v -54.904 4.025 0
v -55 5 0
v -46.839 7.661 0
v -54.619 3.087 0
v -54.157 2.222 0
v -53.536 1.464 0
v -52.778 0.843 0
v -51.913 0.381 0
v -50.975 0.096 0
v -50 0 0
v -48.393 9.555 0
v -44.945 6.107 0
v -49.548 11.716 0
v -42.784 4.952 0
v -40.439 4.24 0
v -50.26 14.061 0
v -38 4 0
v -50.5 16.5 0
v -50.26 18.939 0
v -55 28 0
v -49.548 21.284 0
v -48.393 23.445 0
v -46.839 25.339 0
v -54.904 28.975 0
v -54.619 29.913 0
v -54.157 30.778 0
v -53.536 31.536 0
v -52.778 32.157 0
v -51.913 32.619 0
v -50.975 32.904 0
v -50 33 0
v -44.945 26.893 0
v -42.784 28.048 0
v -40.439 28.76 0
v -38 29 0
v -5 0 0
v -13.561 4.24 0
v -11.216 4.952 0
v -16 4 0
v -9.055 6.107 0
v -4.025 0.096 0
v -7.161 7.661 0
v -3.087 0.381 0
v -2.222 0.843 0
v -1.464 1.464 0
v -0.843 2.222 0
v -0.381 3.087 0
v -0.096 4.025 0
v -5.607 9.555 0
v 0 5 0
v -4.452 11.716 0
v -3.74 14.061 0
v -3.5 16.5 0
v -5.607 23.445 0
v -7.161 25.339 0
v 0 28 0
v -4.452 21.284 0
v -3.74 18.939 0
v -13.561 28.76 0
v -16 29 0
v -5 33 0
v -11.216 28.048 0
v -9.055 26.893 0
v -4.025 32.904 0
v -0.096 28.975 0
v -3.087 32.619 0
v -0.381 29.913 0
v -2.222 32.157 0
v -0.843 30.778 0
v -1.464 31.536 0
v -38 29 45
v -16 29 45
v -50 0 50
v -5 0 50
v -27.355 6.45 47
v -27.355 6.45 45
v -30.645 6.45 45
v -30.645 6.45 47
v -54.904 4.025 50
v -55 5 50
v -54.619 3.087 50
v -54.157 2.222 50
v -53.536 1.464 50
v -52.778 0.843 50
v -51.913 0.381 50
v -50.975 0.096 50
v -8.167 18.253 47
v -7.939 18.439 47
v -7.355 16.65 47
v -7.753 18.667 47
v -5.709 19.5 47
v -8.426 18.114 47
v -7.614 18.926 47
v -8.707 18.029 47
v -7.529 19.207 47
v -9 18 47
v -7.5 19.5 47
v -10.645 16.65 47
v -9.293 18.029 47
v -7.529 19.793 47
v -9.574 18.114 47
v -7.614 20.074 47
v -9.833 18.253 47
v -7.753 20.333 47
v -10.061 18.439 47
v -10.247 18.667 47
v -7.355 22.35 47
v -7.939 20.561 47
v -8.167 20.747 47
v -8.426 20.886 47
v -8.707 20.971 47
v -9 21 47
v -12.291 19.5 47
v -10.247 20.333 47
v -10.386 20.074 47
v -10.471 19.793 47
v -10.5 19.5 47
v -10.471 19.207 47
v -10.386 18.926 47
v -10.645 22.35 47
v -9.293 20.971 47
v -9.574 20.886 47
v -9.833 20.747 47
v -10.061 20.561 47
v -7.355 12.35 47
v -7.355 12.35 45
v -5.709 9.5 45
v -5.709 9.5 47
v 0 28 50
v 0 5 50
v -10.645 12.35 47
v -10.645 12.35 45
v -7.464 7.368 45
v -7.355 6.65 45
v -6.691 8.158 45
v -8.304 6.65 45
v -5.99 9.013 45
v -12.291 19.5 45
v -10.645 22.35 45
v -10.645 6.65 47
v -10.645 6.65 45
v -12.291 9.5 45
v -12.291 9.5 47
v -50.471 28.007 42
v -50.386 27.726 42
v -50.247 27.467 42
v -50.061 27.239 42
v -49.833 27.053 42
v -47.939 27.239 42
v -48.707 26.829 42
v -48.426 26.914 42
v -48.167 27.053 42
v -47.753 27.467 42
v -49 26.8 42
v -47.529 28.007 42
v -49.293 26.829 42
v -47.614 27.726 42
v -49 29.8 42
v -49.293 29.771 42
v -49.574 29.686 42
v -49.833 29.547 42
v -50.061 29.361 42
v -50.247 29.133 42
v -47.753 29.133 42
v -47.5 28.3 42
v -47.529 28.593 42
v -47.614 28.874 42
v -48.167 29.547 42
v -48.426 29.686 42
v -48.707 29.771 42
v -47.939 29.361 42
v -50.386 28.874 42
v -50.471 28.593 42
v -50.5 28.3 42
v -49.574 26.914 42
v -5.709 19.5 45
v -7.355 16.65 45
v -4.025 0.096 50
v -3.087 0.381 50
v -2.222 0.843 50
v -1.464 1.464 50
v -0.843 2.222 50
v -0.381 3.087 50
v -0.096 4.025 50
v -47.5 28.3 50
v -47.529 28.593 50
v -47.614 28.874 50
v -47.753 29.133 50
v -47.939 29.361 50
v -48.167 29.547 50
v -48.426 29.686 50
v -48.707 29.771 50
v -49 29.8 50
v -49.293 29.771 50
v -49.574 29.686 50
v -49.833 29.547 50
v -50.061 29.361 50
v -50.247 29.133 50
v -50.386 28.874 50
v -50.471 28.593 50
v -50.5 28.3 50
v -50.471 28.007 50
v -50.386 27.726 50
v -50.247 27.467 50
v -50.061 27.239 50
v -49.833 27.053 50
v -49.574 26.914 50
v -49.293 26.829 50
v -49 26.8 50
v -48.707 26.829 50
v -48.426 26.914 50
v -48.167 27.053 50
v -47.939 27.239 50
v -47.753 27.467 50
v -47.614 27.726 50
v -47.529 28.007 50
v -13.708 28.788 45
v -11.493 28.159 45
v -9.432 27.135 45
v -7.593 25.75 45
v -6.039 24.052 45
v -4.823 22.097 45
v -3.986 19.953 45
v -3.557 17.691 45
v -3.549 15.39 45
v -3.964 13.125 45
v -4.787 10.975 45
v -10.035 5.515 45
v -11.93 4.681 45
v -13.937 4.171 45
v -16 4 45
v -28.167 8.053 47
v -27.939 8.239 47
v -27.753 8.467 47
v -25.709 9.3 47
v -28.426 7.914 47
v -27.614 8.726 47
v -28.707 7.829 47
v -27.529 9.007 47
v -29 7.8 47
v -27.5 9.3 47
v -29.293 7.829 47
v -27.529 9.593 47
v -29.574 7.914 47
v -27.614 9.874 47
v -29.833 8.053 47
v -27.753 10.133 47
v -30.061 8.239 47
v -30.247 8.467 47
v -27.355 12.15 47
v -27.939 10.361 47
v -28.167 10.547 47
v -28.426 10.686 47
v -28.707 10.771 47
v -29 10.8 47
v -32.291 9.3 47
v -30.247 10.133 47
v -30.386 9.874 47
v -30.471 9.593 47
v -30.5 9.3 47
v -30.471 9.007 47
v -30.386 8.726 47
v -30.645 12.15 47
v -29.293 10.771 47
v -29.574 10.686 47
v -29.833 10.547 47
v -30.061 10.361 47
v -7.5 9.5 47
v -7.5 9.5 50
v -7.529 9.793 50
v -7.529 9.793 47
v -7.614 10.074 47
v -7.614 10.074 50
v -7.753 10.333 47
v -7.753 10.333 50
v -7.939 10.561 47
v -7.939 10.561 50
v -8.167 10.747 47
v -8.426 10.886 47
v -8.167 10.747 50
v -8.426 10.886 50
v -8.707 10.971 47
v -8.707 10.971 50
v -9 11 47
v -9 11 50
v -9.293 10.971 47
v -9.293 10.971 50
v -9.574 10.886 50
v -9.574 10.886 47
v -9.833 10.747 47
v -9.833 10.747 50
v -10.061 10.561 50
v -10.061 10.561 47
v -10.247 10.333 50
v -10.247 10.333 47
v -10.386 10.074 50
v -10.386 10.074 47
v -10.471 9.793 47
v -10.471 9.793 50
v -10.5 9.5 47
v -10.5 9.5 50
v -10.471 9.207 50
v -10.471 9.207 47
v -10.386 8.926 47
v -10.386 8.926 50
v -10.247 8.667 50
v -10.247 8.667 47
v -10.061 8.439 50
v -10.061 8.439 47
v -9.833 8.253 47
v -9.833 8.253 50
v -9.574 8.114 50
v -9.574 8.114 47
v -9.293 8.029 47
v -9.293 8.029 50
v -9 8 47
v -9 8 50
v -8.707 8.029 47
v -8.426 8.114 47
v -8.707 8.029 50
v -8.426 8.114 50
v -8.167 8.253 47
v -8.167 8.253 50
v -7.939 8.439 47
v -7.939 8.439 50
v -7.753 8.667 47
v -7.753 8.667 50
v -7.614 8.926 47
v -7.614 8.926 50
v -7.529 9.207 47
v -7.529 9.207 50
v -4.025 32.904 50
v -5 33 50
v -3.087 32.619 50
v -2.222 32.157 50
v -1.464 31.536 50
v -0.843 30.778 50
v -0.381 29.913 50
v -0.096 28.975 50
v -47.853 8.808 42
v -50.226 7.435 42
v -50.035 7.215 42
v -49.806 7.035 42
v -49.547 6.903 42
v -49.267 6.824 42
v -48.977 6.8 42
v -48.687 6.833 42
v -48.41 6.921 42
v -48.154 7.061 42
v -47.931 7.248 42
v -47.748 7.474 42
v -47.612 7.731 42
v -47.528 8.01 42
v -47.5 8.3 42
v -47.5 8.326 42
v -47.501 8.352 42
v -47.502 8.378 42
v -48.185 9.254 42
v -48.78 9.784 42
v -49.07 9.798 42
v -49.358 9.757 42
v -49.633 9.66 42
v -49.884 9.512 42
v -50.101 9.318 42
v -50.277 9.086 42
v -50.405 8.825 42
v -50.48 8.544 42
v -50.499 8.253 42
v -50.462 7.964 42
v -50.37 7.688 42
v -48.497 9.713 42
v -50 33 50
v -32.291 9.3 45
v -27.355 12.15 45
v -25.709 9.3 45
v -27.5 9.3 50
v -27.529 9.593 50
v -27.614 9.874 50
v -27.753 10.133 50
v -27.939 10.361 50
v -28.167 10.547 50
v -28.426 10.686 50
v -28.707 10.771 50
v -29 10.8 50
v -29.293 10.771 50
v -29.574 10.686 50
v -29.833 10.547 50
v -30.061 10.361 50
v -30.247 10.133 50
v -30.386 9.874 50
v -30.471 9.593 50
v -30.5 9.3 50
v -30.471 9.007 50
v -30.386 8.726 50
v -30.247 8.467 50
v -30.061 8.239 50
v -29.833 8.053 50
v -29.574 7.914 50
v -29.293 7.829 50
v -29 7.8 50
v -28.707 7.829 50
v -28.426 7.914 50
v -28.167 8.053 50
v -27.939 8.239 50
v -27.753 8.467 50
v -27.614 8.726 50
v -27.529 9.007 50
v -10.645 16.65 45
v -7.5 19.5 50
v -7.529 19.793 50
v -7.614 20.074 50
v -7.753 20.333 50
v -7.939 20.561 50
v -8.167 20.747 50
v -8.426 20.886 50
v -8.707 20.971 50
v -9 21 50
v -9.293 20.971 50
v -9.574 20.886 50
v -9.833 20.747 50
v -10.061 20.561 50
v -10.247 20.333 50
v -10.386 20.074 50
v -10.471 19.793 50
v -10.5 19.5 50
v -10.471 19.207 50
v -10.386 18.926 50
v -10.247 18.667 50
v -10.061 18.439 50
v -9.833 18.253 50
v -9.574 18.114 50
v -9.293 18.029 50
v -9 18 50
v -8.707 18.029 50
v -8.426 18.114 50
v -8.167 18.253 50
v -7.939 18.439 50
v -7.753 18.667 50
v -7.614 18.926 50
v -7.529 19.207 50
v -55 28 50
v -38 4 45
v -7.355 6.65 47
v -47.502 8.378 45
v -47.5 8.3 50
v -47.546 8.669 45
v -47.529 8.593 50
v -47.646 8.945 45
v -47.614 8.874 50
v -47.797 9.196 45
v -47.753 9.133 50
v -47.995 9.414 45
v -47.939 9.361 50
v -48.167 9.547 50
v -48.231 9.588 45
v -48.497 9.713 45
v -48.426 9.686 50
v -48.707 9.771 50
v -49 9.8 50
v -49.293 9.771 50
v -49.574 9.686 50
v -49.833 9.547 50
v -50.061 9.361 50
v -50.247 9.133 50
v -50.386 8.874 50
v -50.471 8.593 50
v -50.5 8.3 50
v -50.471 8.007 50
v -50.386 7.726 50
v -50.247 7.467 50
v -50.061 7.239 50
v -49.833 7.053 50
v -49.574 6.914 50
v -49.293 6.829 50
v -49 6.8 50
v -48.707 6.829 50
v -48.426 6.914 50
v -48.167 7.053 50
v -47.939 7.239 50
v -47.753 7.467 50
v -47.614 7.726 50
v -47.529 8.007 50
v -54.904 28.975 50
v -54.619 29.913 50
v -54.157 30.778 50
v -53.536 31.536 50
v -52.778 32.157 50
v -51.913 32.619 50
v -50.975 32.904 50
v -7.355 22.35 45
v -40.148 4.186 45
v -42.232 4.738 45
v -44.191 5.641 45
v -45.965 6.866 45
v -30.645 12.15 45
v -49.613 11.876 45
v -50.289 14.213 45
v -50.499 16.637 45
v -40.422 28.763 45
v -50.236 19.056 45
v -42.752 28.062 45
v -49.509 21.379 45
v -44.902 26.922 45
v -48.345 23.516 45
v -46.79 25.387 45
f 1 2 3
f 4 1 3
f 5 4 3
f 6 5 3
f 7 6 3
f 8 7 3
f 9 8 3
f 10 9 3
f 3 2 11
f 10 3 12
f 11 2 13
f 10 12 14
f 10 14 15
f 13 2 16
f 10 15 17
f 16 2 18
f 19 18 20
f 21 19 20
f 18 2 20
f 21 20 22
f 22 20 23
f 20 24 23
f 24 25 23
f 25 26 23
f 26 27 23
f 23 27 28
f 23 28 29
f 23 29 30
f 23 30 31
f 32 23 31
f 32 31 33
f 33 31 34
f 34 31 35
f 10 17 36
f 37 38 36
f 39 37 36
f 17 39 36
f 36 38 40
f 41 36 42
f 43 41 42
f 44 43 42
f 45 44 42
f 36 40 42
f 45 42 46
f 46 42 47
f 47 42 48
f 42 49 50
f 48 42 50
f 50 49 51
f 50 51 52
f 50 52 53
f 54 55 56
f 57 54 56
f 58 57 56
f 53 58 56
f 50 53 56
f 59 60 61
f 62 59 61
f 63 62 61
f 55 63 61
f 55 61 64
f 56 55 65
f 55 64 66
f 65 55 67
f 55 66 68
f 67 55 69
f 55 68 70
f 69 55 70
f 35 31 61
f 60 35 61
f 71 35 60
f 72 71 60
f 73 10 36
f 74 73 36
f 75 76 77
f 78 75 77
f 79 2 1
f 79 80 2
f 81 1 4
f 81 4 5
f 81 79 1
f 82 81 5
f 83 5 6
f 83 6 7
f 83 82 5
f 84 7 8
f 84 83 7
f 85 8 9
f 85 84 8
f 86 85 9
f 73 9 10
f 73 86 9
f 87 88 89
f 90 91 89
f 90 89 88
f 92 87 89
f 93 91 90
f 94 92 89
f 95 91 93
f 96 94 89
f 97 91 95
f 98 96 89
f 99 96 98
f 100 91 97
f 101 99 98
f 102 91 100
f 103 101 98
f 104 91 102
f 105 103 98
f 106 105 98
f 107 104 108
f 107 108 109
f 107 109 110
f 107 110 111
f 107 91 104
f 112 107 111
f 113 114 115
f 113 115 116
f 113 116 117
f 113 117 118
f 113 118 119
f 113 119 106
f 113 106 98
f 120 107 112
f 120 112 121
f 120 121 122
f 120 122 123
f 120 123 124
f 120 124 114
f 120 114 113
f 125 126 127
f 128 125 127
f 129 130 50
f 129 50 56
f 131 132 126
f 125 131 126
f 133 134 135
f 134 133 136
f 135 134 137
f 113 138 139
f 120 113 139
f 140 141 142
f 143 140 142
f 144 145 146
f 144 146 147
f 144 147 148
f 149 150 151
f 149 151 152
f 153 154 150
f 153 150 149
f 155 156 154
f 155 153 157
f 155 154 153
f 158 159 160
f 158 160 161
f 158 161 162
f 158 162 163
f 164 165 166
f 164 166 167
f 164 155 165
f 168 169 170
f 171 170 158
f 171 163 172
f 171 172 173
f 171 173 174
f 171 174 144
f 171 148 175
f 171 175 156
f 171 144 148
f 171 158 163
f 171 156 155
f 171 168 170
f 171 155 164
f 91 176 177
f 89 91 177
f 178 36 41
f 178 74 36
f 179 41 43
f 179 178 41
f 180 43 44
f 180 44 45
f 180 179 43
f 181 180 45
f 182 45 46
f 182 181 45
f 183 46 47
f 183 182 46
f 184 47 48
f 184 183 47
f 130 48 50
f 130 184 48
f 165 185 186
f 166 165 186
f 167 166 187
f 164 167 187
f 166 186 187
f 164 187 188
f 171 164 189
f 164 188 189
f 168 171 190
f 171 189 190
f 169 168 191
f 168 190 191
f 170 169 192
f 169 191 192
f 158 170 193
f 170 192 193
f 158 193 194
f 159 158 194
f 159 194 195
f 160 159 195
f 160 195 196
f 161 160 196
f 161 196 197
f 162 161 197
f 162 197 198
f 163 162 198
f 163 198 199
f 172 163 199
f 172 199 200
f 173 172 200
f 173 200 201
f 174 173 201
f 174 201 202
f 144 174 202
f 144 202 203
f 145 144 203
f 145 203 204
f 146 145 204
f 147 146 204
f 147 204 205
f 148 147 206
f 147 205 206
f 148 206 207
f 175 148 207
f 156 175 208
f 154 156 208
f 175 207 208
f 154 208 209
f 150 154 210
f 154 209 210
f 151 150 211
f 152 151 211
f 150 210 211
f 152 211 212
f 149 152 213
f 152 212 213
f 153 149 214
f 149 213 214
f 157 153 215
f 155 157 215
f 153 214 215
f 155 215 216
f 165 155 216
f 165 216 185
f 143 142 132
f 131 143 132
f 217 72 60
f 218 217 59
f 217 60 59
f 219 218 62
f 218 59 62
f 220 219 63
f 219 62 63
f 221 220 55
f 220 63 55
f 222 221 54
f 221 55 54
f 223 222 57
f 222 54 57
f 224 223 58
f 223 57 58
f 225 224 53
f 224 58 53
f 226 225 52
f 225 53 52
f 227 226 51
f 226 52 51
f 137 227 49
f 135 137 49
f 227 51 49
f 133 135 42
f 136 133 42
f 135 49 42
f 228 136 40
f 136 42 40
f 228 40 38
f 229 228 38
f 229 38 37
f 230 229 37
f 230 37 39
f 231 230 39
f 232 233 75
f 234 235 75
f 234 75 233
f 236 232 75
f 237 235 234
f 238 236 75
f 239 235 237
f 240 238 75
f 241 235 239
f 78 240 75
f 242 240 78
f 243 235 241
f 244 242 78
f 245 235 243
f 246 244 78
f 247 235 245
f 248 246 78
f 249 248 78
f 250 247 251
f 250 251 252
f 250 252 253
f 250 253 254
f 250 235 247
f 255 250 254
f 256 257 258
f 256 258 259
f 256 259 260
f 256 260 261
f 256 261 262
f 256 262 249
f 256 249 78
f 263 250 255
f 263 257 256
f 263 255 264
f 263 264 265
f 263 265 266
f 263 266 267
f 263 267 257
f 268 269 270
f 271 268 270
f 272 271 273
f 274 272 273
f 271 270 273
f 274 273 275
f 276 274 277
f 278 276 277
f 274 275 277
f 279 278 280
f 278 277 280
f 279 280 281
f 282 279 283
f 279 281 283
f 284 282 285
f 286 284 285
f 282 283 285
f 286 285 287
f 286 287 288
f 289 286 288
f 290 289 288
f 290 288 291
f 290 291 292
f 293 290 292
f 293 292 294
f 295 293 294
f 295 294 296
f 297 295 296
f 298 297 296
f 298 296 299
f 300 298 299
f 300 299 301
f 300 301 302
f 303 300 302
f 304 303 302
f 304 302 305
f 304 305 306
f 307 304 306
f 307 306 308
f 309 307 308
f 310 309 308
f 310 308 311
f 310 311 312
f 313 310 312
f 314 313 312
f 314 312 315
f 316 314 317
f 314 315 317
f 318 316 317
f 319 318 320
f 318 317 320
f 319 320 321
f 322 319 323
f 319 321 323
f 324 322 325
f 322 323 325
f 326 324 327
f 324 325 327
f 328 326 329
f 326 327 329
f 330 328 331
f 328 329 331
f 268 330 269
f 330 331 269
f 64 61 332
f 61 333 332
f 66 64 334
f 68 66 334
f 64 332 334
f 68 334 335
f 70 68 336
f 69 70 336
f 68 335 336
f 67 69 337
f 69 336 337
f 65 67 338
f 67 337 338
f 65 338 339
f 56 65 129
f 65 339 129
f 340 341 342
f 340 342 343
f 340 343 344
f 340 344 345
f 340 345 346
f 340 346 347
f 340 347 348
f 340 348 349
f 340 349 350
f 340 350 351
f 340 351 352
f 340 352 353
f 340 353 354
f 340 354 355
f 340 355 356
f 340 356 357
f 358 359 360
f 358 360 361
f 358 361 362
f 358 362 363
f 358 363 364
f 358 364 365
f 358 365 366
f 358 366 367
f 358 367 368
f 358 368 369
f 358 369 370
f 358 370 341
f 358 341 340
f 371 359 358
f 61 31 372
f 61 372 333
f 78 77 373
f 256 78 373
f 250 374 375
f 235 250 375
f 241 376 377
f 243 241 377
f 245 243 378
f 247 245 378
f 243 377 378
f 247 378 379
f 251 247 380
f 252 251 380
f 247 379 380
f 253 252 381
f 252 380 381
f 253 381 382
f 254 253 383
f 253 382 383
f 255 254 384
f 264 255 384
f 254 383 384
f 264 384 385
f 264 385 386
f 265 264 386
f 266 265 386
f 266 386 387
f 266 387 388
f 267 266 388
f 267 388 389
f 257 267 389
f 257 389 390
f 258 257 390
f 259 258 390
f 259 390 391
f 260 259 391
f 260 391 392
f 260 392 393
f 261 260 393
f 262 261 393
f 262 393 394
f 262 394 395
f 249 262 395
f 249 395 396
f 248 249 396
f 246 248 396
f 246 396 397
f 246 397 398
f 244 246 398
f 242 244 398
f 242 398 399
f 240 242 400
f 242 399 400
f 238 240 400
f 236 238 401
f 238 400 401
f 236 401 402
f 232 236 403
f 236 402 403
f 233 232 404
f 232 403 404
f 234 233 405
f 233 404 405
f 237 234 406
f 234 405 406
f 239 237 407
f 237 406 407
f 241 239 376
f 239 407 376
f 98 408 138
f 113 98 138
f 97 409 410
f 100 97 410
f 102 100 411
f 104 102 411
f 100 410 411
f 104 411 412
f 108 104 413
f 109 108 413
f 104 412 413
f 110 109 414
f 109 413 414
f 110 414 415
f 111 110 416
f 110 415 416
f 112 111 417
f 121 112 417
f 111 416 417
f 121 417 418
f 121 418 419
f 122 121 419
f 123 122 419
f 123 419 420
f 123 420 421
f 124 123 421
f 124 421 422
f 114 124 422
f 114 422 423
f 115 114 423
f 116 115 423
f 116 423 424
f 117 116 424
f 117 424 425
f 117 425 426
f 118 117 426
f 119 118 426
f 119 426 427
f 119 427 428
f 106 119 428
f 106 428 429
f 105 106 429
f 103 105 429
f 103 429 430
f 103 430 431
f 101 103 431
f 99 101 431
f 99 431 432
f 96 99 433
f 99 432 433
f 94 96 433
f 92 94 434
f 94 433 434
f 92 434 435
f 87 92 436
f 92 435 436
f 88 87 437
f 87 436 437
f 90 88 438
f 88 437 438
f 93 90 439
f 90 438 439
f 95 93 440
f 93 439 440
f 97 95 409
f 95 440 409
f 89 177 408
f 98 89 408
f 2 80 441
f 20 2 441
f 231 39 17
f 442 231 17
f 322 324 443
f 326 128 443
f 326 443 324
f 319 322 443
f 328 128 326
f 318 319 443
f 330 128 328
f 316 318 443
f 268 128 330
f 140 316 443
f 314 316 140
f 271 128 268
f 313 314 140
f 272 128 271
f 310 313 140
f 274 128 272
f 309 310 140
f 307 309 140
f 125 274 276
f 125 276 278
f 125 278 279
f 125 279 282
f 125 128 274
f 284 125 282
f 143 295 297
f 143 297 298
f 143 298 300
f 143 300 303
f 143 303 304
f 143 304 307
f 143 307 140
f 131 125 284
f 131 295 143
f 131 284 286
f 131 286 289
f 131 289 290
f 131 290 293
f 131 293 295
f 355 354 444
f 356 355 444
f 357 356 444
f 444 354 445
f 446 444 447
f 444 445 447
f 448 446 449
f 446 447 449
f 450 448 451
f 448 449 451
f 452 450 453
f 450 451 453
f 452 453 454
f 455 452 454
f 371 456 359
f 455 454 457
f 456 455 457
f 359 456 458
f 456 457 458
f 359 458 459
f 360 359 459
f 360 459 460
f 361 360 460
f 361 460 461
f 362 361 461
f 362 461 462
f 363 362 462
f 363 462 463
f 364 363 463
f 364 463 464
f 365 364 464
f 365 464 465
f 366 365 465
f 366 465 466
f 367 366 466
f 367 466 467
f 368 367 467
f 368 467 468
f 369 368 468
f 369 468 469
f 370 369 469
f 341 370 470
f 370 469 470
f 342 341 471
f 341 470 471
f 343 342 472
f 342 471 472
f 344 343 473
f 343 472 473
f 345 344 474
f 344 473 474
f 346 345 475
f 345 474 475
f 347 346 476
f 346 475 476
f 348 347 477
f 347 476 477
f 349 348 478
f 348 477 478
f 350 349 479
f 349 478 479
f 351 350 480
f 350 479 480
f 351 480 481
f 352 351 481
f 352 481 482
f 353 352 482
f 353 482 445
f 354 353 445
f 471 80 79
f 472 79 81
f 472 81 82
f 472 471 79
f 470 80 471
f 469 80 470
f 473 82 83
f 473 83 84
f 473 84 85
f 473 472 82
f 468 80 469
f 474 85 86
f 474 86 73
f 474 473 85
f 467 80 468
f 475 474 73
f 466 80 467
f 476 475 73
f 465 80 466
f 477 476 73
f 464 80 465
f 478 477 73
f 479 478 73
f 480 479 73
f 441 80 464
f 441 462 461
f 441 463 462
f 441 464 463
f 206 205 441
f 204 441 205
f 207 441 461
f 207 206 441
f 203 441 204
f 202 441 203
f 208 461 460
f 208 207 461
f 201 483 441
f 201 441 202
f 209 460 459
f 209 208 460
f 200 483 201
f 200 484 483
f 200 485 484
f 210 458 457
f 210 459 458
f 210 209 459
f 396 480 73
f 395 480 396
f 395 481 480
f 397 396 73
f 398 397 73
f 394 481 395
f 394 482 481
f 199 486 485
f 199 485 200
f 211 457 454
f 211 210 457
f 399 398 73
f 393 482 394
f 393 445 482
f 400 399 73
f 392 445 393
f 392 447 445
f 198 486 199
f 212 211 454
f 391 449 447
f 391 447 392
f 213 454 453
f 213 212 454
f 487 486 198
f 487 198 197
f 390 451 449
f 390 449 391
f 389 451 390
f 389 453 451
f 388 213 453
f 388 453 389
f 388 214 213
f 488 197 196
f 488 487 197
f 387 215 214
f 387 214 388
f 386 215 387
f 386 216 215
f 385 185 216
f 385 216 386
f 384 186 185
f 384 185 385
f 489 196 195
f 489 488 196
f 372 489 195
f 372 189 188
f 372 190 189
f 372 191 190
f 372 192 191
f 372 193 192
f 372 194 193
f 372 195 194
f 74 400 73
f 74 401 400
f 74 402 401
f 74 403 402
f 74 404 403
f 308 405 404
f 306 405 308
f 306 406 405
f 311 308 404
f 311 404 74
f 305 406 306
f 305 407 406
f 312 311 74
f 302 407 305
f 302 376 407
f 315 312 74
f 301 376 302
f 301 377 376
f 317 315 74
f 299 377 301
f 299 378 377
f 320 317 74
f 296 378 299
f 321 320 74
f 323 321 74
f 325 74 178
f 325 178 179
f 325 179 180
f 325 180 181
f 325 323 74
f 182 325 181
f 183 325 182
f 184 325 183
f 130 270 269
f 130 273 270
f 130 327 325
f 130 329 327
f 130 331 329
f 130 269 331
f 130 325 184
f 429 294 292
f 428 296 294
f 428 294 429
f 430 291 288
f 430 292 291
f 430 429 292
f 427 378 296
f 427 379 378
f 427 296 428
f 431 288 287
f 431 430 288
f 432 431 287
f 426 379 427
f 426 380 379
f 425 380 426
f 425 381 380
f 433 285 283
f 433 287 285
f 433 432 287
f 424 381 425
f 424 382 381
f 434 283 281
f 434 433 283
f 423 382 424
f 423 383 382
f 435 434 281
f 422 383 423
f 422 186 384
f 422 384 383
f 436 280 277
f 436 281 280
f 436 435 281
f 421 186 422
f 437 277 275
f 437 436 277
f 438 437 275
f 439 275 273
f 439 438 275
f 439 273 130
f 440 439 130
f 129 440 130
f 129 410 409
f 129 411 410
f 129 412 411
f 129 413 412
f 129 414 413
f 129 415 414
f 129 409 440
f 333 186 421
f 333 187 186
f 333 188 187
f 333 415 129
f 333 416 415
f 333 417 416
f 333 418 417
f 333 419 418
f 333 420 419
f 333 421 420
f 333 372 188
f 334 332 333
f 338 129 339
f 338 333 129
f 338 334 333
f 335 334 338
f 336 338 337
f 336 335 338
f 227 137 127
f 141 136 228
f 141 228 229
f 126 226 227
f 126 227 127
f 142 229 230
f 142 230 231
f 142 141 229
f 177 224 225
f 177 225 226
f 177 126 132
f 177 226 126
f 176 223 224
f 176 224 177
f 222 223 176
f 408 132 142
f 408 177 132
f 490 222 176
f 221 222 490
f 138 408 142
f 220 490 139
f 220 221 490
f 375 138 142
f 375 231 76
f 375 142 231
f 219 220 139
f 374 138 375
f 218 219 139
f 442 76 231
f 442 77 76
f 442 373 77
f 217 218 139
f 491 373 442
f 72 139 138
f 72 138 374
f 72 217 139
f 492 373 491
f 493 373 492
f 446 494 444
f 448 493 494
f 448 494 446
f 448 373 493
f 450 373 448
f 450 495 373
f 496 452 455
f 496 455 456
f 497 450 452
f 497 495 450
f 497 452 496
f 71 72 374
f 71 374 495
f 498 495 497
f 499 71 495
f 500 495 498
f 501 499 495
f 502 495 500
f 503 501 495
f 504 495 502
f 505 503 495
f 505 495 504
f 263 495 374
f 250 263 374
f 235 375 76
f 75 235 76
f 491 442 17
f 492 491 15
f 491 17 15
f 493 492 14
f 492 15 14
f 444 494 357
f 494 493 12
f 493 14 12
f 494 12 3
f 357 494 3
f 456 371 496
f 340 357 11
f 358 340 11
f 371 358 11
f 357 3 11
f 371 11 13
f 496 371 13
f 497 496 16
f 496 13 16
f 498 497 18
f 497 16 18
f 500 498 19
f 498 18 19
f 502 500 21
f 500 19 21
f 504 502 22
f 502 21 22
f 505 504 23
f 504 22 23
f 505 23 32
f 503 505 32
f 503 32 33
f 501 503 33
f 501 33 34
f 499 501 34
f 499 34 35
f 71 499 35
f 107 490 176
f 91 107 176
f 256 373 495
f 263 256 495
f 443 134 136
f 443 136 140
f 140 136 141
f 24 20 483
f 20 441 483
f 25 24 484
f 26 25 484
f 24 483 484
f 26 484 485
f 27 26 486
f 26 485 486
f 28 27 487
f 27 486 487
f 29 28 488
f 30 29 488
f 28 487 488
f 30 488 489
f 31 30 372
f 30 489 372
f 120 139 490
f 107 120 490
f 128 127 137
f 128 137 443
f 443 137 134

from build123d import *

# Parameters (mm, degrees)
ESQUISSE1_W             = 55
ESQUISSE1_H             = 33
BOSS_EXTRU_1_DEPTH      = 50
ENL_V_MAT_EXTRU_2_DEPTH = 45
CONG_1_R                = 5
ESQUISSE3_R             = 1.5
ENL_V_MAT_EXTRU_3_DEPTH = 10
ENL_V_MAT_EXTRU_4_DEPTH = 2
ESQUISSE5_R             = 1.5
ENL_V_MAT_EXTRU_5_DEPTH = 4
ESQUISSE6_R             = 1.5
ENL_V_MAT_EXTRU_7_DEPTH = 4


with BuildPart() as part:
    # Esquisse1 → Boss.-Extru.1 (new body)
    with BuildSketch(Plane.XY):
        with Locations((-27.5, 16.5)):
            Rectangle(ESQUISSE1_W, ESQUISSE1_H)
    extrude(amount=BOSS_EXTRU_1_DEPTH)

    # Esquisse2 → Enlèv. mat.-Extru.2 (cut)
    with BuildSketch(Plane.XY):
        with BuildLine():
            Line((-38, 29), (-16, 29))
            ThreePointArc((-16, 29), (-3.5, 16.5), (-16, 4))
            Line((-16, 4), (-38, 4))
            ThreePointArc((-38, 4), (-50.5, 16.5), (-38, 29))
        make_face()
    extrude(amount=ENL_V_MAT_EXTRU_2_DEPTH, mode=Mode.SUBTRACT)

    # Congé1
    cong_1_edges = [part.edges().sort_by_distance(p)[0] for p in [
        (0, 0, 25),
        (-55, 0, 25),
        (-55, 33, 25),
        (0, 33, 25),
    ]]
    fillet(cong_1_edges, radius=CONG_1_R)

    # Esquisse3 → Enlèv. mat.-Extru.3 (cut)
    with BuildSketch(Plane.XY.offset(50)):
        with Locations((-29, 9.3)):
            Circle(ESQUISSE3_R)
        with Locations((-9, 19.5)):
            Circle(ESQUISSE3_R)
        with Locations((-9, 9.5)):
            Circle(ESQUISSE3_R)
    extrude(amount=-ENL_V_MAT_EXTRU_3_DEPTH, mode=Mode.SUBTRACT)

    # Esquisse4 → Enlèv. mat.-Extru.4 (cut)
    with BuildSketch(Plane(origin=(0, 0, 45), x_dir=(-1, 0, 0), z_dir=(0, 0, -1))):
        Polygon((27.354551733, 6.45), (30.645448267, 6.45), (32.290896534, 9.3), (30.645448267, 12.15), (27.354551733, 12.15), (25.709103466, 9.3), align=None)
        Polygon((7.354551733, 6.65), (10.645448267, 6.65), (12.290896534, 9.5), (10.645448267, 12.35), (7.354551733, 12.35), (5.709103466, 9.5), align=None)
        Polygon((7.354551733, 16.65), (10.645448267, 16.65), (12.290896534, 19.5), (10.645448267, 22.35), (7.354551733, 22.35), (5.709103466, 19.5), align=None)
    extrude(amount=-ENL_V_MAT_EXTRU_4_DEPTH, mode=Mode.SUBTRACT)

    # Esquisse5 → Enlèv. mat.-Extru.5 (cut)
    with BuildSketch(Plane.XY.offset(50)):
        with Locations((-49, 28.3)):
            Circle(ESQUISSE5_R)
        with Locations((-49, 8.3)):
            Circle(ESQUISSE5_R)
    extrude(amount=-ENL_V_MAT_EXTRU_5_DEPTH, mode=Mode.SUBTRACT)

    # Esquisse6 → Enlèv. mat.-Extru.7 (cut)
    with BuildSketch(Plane.XY.offset(46)):
        with Locations((-49, 28.3)):
            Circle(ESQUISSE6_R)
        with Locations((-49, 8.3)):
            Circle(ESQUISSE6_R)
    extrude(amount=-ENL_V_MAT_EXTRU_7_DEPTH, mode=Mode.SUBTRACT)


solid = part.part
